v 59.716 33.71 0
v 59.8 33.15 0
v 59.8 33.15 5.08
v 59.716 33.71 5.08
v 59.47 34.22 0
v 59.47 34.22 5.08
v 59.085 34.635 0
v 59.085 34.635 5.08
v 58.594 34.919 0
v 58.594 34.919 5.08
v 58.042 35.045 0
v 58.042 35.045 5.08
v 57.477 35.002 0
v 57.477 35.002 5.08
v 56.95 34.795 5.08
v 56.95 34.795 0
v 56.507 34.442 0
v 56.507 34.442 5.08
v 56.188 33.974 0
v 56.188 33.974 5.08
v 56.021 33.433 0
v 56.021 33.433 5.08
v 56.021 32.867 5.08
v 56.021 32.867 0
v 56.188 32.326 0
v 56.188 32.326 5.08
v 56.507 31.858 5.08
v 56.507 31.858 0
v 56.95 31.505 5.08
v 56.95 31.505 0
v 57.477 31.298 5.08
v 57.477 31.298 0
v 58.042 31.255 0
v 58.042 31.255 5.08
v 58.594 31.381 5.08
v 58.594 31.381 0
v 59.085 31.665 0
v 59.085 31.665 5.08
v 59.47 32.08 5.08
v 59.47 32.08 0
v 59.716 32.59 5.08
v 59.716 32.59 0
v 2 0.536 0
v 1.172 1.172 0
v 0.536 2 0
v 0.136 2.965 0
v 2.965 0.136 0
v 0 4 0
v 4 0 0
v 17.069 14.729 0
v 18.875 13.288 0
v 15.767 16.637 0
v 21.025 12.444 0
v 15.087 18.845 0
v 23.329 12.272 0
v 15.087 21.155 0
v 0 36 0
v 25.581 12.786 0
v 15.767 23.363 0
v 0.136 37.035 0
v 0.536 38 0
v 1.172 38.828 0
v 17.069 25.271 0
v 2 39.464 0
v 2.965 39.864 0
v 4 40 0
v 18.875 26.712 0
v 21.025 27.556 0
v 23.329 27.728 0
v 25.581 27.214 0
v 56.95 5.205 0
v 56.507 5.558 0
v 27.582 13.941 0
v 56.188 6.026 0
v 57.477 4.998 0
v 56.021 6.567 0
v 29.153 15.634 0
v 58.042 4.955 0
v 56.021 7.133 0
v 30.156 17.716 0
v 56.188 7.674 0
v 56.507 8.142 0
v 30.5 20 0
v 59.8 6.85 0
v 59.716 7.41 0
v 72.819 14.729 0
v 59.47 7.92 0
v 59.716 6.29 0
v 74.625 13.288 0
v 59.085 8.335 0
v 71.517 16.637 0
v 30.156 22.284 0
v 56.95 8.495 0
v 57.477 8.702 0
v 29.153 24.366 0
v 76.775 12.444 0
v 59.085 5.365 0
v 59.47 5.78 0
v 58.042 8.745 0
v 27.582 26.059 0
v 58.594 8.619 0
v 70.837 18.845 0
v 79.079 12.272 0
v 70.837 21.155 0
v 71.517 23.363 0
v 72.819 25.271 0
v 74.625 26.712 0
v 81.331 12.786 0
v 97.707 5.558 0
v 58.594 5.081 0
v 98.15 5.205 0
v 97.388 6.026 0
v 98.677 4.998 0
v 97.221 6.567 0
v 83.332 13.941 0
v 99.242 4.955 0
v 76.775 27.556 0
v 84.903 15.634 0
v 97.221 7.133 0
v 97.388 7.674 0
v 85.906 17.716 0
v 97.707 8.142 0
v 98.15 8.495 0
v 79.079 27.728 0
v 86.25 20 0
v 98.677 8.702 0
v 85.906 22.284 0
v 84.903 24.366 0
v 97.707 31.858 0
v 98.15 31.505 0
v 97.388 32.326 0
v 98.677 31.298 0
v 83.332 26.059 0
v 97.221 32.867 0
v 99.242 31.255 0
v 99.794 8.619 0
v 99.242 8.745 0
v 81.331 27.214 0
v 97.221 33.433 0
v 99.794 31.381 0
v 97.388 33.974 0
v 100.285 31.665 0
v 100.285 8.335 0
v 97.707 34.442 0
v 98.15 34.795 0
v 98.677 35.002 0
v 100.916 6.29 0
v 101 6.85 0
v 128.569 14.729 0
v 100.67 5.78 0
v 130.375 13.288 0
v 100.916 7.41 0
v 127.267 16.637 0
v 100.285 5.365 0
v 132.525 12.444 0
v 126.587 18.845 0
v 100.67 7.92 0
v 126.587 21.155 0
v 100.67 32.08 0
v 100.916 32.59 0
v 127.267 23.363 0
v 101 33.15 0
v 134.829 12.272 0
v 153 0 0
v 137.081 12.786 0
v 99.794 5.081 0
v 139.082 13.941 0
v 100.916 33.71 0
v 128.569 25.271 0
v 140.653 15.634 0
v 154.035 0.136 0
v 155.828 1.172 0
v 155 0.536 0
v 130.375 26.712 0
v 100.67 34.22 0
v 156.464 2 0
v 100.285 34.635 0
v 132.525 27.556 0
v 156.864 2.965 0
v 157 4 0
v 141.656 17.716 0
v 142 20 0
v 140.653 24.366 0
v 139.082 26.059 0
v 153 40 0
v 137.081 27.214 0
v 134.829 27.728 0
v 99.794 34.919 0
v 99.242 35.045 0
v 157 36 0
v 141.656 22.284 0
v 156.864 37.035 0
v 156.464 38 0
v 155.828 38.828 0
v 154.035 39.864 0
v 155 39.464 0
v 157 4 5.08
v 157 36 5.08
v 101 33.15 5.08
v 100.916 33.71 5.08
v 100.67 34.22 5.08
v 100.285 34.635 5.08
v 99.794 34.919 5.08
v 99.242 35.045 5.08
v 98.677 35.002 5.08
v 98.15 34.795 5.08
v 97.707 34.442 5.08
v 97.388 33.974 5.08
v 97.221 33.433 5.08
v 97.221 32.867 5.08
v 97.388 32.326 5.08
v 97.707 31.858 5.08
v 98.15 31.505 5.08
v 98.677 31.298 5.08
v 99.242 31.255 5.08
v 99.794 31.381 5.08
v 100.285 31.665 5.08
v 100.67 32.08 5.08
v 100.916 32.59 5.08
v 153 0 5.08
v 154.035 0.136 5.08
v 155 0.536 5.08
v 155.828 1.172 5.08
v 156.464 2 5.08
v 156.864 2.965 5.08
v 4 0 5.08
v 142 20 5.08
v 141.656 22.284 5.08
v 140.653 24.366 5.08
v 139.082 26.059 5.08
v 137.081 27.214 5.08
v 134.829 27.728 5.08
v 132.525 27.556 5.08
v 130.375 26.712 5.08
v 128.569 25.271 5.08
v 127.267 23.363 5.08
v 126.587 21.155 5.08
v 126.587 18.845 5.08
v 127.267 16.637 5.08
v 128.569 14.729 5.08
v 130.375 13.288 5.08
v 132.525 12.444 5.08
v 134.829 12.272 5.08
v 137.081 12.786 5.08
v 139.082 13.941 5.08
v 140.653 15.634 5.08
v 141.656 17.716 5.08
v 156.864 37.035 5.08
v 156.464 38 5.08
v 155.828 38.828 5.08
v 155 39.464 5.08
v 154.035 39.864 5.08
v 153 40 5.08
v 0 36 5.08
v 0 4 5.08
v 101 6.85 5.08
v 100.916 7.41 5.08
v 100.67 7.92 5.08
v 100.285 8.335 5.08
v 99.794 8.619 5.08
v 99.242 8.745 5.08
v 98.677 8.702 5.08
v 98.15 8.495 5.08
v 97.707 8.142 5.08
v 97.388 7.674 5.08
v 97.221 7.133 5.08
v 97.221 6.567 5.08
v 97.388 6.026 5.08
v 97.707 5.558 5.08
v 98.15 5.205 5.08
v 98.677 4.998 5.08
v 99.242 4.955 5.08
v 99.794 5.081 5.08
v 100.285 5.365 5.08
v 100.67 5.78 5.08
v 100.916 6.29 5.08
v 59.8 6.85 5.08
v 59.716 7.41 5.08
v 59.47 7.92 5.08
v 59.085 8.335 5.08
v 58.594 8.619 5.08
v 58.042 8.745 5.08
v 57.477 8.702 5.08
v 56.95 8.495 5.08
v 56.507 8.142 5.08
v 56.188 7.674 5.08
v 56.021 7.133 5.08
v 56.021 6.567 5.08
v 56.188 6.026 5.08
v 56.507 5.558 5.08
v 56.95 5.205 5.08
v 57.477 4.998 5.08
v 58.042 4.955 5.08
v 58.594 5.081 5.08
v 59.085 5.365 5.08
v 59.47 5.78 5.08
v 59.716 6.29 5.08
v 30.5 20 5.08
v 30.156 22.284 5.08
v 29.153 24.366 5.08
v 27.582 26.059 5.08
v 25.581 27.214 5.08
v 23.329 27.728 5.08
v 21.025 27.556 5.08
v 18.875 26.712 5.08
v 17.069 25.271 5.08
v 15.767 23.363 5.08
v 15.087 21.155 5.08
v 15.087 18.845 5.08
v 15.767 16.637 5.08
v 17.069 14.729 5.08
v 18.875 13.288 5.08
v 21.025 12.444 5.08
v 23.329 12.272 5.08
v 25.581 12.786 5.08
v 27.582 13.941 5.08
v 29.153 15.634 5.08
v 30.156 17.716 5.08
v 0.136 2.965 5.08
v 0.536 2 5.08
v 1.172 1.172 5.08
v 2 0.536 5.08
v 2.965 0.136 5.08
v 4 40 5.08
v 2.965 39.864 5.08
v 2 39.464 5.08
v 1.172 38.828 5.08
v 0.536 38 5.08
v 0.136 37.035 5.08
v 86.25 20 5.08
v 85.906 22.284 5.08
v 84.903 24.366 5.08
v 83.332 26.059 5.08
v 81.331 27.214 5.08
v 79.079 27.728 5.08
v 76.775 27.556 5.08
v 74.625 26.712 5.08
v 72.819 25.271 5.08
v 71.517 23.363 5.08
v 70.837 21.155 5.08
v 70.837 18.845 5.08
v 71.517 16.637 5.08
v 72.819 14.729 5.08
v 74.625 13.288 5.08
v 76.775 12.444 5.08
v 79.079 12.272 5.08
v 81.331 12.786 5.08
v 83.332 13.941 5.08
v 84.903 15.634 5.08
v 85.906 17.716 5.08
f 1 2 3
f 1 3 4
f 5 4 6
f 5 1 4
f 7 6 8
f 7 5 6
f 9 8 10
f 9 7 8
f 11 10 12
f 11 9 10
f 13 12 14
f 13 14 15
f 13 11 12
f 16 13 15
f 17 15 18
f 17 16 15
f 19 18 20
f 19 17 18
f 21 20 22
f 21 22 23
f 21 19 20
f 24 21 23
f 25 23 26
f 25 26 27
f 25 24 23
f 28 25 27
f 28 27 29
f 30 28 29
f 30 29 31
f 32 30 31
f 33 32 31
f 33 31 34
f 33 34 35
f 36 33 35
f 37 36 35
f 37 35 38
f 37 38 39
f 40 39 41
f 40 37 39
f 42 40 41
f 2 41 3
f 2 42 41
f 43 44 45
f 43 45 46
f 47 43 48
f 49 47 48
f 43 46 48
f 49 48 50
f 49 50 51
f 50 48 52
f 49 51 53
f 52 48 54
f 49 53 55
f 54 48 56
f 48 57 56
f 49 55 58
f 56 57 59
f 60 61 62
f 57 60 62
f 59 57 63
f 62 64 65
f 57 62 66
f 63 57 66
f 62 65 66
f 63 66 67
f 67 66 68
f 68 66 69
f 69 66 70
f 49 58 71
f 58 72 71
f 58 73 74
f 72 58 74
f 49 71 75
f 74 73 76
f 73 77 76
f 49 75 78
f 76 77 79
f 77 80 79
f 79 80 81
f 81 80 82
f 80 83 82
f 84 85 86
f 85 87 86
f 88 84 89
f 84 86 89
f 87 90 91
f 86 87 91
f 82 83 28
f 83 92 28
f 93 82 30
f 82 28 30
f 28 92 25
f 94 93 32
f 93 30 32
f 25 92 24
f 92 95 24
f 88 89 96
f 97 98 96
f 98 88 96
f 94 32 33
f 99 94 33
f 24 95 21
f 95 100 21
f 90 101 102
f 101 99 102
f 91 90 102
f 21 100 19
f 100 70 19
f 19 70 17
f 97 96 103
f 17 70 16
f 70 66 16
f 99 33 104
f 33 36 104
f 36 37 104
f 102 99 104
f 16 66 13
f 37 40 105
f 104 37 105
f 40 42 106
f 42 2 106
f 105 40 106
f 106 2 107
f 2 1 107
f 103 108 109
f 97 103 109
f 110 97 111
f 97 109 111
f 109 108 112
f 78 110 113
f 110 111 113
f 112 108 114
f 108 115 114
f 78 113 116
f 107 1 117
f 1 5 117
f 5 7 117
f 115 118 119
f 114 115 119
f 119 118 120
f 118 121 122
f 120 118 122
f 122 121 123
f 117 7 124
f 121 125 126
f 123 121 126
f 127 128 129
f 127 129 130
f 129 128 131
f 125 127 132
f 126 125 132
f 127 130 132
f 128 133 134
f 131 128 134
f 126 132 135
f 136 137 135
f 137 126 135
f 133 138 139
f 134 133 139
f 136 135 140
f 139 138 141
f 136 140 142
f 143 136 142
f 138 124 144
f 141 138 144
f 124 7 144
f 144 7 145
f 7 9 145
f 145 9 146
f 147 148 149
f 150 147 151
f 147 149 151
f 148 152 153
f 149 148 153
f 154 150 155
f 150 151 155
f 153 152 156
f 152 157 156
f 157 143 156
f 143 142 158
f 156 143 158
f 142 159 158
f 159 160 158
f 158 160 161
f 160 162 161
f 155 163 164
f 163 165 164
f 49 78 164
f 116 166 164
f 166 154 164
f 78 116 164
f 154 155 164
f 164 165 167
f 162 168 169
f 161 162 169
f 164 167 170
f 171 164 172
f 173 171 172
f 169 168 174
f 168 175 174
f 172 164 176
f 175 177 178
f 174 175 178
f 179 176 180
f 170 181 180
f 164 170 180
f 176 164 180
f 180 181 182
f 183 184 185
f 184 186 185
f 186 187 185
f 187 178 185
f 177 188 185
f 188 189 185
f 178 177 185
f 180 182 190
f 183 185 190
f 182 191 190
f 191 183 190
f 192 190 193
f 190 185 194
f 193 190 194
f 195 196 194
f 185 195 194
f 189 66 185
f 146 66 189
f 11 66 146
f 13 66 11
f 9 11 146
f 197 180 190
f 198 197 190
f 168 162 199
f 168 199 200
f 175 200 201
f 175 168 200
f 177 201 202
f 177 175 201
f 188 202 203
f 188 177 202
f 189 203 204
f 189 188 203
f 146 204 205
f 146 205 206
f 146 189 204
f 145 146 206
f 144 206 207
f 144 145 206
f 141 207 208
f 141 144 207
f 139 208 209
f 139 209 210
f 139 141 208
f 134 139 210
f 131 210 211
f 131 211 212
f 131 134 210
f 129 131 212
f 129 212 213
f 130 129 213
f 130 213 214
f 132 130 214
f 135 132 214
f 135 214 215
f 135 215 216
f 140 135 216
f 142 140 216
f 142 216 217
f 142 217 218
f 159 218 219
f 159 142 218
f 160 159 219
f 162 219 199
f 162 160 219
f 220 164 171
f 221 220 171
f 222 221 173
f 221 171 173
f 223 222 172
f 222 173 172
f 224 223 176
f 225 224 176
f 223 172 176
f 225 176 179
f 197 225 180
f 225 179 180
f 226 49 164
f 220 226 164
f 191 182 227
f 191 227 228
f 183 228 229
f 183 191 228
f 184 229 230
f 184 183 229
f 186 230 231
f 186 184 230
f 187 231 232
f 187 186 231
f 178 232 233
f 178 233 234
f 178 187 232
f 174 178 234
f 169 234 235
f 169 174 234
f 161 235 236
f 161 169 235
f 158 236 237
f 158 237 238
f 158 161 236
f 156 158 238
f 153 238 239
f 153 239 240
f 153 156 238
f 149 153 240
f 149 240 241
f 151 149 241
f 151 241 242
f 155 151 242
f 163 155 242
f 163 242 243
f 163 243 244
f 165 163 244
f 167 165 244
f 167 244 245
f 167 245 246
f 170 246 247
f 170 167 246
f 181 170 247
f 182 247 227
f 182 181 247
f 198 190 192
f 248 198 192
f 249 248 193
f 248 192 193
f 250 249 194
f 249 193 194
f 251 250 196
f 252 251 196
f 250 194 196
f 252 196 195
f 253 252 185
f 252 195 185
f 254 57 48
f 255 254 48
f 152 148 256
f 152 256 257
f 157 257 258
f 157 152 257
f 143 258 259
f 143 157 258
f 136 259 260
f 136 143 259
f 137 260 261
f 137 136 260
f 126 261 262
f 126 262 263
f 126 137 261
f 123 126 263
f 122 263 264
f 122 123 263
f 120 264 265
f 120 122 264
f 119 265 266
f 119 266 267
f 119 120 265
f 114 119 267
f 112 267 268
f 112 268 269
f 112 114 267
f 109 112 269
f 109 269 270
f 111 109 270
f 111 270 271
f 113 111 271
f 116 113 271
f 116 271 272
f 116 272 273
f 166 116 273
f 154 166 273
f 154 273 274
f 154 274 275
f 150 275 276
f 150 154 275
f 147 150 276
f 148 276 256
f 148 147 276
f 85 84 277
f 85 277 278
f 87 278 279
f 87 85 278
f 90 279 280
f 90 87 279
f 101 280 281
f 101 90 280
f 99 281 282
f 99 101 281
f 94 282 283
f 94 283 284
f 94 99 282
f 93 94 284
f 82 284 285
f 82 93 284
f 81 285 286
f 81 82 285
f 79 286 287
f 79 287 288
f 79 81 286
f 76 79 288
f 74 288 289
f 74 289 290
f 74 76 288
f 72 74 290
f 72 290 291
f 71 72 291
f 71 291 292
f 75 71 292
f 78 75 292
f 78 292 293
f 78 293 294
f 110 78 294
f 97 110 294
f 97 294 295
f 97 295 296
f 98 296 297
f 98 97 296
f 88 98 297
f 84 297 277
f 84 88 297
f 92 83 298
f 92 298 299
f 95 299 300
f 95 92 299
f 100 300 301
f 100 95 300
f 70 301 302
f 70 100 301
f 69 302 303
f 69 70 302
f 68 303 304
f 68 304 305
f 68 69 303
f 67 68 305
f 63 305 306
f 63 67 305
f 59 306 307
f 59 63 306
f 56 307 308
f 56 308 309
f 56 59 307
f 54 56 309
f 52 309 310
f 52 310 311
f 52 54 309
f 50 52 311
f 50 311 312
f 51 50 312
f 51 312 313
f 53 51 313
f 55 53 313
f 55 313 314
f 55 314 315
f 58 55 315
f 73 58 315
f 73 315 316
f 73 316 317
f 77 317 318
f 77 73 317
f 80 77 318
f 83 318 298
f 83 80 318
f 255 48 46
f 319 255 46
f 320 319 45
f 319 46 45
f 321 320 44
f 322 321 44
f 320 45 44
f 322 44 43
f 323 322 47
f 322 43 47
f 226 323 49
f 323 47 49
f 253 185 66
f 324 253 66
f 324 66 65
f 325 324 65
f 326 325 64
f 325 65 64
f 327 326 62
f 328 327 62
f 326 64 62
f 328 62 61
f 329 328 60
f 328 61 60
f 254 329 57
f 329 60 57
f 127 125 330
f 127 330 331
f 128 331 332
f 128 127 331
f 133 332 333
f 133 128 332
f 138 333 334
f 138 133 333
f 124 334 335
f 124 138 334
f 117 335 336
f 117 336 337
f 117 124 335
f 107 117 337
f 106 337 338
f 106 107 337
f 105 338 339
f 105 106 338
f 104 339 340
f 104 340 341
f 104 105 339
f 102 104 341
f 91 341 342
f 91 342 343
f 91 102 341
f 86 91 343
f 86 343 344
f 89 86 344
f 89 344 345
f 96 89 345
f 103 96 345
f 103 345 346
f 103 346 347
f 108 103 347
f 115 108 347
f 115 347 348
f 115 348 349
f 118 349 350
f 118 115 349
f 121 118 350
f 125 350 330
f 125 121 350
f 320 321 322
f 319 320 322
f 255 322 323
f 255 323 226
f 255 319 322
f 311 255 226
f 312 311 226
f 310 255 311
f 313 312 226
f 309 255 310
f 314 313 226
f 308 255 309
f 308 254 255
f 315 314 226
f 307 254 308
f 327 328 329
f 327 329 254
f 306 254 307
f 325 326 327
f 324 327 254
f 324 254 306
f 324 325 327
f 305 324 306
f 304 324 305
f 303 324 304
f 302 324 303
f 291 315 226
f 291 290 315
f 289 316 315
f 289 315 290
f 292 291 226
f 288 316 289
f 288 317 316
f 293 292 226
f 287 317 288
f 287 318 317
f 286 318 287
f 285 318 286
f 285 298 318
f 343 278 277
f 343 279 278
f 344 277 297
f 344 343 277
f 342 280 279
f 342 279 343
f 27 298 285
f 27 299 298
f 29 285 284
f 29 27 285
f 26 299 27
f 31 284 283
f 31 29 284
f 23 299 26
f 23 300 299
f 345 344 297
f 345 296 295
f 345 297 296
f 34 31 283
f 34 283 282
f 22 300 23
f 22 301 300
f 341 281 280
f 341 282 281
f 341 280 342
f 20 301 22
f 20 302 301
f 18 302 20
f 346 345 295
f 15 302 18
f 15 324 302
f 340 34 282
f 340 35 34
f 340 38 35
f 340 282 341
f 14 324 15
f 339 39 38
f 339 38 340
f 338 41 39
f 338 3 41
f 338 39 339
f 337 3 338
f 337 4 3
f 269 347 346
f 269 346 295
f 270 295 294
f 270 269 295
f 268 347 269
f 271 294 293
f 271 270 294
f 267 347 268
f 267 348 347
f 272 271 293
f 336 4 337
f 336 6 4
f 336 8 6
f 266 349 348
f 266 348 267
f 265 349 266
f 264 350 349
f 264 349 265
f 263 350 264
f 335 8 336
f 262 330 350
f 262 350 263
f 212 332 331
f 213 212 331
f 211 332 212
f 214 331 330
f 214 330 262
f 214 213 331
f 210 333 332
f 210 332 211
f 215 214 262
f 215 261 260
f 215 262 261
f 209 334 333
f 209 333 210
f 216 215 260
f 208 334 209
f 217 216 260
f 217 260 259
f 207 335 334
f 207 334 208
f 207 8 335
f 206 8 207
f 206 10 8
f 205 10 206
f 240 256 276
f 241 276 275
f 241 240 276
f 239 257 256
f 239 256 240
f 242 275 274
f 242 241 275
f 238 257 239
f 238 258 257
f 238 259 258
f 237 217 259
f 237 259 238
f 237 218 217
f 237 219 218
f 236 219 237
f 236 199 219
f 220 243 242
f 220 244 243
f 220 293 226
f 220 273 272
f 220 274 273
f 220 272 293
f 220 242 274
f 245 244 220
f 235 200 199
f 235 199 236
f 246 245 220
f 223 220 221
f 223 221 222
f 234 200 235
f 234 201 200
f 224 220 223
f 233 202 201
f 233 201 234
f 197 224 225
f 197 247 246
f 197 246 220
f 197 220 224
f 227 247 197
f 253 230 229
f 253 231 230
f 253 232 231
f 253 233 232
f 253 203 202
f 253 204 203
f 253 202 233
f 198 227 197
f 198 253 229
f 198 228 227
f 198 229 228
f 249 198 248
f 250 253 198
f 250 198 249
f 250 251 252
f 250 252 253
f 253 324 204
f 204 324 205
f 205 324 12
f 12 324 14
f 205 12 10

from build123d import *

# Parameters (mm, degrees)
F0_R     = 1.9
F0_R_2   = 7.75
F1_DEPTH = 5.08


with BuildPart() as f1:
    # F0 (on Top) → F1 (new body)
    with BuildSketch(Plane.XY):
        with BuildLine():
            ThreePointArc((0, 4), (1.171573, 1.171573), (4, 0))
            Line((4, 0), (153, 0))
            ThreePointArc((153, 0), (155.828427, 1.171573), (157, 4))
            Line((157, 4), (157, 36))
            ThreePointArc((157, 36), (155.828427, 38.828427), (153, 40))
            Line((153, 40), (4, 40))
            ThreePointArc((4, 40), (1.171573, 38.828427), (0, 36))
            Line((0, 36), (0, 4))
        make_face()
        with Locations((57.9, 6.85)):
            Circle(F0_R, mode=Mode.SUBTRACT)
        with Locations((99.1, 6.85)):
            Circle(F0_R, mode=Mode.SUBTRACT)
        with Locations((22.75, 20)):
            Circle(F0_R_2, mode=Mode.SUBTRACT)
        with Locations((57.9, 33.15)):
            Circle(F0_R, mode=Mode.SUBTRACT)
        with Locations((78.5, 20)):
            Circle(F0_R_2, mode=Mode.SUBTRACT)
        with Locations((134.25, 20)):
            Circle(F0_R_2, mode=Mode.SUBTRACT)
        with Locations((99.1, 33.15)):
            Circle(F0_R, mode=Mode.SUBTRACT)
    extrude(amount=F1_DEPTH)


solid = f1.part
